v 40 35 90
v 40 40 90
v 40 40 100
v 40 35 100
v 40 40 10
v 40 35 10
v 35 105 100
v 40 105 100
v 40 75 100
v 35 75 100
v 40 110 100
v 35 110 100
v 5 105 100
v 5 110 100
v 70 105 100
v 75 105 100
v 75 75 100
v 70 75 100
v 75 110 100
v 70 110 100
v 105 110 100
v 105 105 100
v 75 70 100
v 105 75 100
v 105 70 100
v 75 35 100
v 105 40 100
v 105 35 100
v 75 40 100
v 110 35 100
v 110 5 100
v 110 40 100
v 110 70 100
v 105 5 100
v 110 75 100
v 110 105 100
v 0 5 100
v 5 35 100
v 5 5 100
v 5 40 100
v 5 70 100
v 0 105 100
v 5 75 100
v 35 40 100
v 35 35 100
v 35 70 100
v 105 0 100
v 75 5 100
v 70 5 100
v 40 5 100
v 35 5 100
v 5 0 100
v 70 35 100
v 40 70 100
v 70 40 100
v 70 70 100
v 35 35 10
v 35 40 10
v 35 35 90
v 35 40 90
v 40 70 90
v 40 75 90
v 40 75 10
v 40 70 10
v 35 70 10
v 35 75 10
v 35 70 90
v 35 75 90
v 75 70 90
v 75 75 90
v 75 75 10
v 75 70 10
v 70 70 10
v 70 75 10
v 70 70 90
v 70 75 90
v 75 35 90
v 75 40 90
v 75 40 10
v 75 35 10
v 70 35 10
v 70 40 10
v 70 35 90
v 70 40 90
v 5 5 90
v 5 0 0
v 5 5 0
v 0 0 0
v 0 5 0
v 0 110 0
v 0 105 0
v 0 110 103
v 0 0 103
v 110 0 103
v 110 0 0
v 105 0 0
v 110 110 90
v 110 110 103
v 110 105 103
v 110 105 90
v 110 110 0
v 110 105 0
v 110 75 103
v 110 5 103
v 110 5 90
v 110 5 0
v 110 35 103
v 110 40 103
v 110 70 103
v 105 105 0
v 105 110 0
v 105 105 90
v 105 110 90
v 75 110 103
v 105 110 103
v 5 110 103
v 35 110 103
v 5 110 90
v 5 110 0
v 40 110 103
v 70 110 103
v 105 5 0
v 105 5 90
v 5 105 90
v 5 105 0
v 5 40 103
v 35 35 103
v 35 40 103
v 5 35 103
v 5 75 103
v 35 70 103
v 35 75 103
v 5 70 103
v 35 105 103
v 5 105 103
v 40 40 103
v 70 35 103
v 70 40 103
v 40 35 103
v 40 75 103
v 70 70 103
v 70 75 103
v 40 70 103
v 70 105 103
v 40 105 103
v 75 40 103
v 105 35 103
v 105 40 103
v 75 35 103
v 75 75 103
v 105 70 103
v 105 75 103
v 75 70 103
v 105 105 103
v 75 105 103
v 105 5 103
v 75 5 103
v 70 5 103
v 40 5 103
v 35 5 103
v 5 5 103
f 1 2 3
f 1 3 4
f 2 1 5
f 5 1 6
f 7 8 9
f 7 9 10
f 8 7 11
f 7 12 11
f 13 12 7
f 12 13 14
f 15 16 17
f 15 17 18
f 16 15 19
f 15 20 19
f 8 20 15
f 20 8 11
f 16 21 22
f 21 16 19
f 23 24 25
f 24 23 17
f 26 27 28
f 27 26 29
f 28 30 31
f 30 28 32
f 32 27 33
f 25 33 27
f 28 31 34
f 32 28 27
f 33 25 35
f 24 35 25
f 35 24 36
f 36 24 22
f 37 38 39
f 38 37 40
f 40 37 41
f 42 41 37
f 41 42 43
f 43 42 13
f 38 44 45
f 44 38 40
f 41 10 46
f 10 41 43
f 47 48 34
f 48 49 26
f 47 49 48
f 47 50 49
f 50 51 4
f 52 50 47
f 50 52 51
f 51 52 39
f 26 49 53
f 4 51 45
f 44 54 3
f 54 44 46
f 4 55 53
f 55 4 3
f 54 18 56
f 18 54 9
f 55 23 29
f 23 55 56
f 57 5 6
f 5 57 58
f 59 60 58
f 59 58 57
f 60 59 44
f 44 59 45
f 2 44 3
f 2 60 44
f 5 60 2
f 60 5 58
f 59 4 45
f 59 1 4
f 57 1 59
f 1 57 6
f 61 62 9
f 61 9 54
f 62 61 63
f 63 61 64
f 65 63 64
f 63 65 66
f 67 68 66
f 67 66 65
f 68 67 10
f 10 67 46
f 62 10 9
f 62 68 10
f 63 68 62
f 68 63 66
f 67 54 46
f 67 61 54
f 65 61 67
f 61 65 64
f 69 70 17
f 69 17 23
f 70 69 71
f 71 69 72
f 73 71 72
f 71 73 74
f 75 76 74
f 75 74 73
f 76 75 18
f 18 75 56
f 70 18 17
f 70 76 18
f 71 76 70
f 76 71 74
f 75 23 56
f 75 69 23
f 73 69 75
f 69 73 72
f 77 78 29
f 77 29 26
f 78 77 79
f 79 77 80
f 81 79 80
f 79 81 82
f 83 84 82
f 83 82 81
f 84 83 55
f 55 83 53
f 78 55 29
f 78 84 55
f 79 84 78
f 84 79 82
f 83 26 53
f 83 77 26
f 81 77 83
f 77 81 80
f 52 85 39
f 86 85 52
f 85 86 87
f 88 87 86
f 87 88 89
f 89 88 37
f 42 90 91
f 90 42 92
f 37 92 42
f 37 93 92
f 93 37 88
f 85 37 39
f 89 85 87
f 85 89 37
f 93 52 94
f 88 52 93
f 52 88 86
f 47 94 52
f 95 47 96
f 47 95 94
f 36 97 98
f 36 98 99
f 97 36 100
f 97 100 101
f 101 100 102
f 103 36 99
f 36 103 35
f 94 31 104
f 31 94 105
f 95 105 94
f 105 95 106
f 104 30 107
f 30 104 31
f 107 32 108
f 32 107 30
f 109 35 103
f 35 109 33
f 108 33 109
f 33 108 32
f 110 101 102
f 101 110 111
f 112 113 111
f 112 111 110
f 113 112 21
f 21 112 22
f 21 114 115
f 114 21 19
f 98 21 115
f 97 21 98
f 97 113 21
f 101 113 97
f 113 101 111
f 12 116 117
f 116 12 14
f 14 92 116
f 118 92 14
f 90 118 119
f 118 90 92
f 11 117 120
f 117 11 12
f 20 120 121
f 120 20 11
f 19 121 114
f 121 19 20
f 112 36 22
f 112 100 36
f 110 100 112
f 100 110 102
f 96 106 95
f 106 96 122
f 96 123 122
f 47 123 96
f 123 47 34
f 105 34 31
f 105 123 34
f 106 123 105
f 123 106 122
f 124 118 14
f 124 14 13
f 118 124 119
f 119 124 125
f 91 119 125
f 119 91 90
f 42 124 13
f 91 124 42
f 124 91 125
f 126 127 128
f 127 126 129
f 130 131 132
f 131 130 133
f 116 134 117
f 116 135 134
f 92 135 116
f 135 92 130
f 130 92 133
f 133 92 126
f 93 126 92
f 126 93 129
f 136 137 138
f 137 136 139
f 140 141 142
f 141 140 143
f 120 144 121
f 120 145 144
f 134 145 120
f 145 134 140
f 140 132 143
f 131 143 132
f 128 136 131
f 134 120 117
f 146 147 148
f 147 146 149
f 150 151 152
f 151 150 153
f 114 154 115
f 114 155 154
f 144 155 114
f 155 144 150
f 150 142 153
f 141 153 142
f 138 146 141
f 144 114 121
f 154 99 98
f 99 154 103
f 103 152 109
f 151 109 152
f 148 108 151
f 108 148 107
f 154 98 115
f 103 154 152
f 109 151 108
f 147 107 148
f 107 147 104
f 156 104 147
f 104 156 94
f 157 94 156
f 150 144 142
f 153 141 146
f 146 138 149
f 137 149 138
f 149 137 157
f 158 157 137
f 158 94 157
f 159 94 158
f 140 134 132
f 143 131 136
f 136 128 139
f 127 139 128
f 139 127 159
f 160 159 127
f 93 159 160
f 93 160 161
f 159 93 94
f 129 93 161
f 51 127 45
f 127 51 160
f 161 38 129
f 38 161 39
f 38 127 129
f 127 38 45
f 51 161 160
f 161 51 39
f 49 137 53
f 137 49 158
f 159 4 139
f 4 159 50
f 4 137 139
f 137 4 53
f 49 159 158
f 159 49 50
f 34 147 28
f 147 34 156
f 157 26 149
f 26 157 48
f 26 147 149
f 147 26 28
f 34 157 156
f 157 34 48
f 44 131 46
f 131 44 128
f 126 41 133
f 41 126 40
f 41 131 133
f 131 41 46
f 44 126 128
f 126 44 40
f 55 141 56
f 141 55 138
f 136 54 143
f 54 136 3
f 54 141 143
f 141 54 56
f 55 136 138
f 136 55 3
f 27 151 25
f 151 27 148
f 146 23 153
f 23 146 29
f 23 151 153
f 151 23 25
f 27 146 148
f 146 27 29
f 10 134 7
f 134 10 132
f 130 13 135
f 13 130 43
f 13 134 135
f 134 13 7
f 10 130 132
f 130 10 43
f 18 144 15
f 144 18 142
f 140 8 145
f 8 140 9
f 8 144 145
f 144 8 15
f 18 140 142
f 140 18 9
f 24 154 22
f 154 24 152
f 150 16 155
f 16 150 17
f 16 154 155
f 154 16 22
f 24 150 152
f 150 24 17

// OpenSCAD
    module stand()
    {
    difference(){ union() {
        translate([0,0,0])
        cube([5,5,100]);    
        translate([105,105,0])
        cube([5,5,100]);    
        translate([105,0,0])
        cube([5,5,100]);    
        translate([0,105,0])
        cube([5,5,100]);    
        
        translate([0,0,100])
        cube([110,110,3]); 
        
    translate([35,35,10])
    union() {    
        
            translate([0,0,0])
        cube([5,5,90]);            
            
        translate([0,35,0])
        cube([5,5,90]);            
    
        translate([35,35,0])
        cube([5,5,90]);            
    
        translate([35,0,0])
        cube([5,5,90]);      
    }    
        }   
         for(y=[0:1:3])
        for(x=[0:1:3])
        {
            translate([5*(x+1)+x*30,5*(y+1)+y*30,90])
        cube([30,30,30]);    
        }
        
         
    }
    }
        stand();
    
    
    module camera()
    {
        difference() {
            
        union() {
            
    
            
        cube([50,50,4]);
        translate([10+2,10+2,3])
        cylinder(d=1.5,h=10);
        translate([10+2,10+2,3])
        cylinder(d=3,h=5);        
            
            
        translate([10+2+21,10+2,3])
        cylinder(d=1.5,h=10);
        translate([10+2+21,10+2,3])
        cylinder(d=3,h=5);                
    
    
        translate([10+2,10+2+12.5,3])
        cylinder(d=1.5,h=10);
        translate([10+2,10+2+12.5,3])
        cylinder(d=3,h=5);        
            
            
        translate([10+2+21,10+2+12.5,3])
        cylinder(d=1.5,h=10);
        translate([10+2+21,10+2+12.5,3])
        cylinder(d=3,h=5);      
    
    
    
       
    
        }
        
        translate([2,2,0.4])
        union(){
        translate([0,0,0])
        cube([5.2,5.2,100]);            
            
        translate([0,35,0])
        cube([5.2,5.2,100]);            
    
        translate([35,35,0])
        cube([5.2,5.2,100]);            
    
        translate([35,0,0])
        cube([5.2,5.2,100]);            
        }
    }
    }
    
    //camera();
